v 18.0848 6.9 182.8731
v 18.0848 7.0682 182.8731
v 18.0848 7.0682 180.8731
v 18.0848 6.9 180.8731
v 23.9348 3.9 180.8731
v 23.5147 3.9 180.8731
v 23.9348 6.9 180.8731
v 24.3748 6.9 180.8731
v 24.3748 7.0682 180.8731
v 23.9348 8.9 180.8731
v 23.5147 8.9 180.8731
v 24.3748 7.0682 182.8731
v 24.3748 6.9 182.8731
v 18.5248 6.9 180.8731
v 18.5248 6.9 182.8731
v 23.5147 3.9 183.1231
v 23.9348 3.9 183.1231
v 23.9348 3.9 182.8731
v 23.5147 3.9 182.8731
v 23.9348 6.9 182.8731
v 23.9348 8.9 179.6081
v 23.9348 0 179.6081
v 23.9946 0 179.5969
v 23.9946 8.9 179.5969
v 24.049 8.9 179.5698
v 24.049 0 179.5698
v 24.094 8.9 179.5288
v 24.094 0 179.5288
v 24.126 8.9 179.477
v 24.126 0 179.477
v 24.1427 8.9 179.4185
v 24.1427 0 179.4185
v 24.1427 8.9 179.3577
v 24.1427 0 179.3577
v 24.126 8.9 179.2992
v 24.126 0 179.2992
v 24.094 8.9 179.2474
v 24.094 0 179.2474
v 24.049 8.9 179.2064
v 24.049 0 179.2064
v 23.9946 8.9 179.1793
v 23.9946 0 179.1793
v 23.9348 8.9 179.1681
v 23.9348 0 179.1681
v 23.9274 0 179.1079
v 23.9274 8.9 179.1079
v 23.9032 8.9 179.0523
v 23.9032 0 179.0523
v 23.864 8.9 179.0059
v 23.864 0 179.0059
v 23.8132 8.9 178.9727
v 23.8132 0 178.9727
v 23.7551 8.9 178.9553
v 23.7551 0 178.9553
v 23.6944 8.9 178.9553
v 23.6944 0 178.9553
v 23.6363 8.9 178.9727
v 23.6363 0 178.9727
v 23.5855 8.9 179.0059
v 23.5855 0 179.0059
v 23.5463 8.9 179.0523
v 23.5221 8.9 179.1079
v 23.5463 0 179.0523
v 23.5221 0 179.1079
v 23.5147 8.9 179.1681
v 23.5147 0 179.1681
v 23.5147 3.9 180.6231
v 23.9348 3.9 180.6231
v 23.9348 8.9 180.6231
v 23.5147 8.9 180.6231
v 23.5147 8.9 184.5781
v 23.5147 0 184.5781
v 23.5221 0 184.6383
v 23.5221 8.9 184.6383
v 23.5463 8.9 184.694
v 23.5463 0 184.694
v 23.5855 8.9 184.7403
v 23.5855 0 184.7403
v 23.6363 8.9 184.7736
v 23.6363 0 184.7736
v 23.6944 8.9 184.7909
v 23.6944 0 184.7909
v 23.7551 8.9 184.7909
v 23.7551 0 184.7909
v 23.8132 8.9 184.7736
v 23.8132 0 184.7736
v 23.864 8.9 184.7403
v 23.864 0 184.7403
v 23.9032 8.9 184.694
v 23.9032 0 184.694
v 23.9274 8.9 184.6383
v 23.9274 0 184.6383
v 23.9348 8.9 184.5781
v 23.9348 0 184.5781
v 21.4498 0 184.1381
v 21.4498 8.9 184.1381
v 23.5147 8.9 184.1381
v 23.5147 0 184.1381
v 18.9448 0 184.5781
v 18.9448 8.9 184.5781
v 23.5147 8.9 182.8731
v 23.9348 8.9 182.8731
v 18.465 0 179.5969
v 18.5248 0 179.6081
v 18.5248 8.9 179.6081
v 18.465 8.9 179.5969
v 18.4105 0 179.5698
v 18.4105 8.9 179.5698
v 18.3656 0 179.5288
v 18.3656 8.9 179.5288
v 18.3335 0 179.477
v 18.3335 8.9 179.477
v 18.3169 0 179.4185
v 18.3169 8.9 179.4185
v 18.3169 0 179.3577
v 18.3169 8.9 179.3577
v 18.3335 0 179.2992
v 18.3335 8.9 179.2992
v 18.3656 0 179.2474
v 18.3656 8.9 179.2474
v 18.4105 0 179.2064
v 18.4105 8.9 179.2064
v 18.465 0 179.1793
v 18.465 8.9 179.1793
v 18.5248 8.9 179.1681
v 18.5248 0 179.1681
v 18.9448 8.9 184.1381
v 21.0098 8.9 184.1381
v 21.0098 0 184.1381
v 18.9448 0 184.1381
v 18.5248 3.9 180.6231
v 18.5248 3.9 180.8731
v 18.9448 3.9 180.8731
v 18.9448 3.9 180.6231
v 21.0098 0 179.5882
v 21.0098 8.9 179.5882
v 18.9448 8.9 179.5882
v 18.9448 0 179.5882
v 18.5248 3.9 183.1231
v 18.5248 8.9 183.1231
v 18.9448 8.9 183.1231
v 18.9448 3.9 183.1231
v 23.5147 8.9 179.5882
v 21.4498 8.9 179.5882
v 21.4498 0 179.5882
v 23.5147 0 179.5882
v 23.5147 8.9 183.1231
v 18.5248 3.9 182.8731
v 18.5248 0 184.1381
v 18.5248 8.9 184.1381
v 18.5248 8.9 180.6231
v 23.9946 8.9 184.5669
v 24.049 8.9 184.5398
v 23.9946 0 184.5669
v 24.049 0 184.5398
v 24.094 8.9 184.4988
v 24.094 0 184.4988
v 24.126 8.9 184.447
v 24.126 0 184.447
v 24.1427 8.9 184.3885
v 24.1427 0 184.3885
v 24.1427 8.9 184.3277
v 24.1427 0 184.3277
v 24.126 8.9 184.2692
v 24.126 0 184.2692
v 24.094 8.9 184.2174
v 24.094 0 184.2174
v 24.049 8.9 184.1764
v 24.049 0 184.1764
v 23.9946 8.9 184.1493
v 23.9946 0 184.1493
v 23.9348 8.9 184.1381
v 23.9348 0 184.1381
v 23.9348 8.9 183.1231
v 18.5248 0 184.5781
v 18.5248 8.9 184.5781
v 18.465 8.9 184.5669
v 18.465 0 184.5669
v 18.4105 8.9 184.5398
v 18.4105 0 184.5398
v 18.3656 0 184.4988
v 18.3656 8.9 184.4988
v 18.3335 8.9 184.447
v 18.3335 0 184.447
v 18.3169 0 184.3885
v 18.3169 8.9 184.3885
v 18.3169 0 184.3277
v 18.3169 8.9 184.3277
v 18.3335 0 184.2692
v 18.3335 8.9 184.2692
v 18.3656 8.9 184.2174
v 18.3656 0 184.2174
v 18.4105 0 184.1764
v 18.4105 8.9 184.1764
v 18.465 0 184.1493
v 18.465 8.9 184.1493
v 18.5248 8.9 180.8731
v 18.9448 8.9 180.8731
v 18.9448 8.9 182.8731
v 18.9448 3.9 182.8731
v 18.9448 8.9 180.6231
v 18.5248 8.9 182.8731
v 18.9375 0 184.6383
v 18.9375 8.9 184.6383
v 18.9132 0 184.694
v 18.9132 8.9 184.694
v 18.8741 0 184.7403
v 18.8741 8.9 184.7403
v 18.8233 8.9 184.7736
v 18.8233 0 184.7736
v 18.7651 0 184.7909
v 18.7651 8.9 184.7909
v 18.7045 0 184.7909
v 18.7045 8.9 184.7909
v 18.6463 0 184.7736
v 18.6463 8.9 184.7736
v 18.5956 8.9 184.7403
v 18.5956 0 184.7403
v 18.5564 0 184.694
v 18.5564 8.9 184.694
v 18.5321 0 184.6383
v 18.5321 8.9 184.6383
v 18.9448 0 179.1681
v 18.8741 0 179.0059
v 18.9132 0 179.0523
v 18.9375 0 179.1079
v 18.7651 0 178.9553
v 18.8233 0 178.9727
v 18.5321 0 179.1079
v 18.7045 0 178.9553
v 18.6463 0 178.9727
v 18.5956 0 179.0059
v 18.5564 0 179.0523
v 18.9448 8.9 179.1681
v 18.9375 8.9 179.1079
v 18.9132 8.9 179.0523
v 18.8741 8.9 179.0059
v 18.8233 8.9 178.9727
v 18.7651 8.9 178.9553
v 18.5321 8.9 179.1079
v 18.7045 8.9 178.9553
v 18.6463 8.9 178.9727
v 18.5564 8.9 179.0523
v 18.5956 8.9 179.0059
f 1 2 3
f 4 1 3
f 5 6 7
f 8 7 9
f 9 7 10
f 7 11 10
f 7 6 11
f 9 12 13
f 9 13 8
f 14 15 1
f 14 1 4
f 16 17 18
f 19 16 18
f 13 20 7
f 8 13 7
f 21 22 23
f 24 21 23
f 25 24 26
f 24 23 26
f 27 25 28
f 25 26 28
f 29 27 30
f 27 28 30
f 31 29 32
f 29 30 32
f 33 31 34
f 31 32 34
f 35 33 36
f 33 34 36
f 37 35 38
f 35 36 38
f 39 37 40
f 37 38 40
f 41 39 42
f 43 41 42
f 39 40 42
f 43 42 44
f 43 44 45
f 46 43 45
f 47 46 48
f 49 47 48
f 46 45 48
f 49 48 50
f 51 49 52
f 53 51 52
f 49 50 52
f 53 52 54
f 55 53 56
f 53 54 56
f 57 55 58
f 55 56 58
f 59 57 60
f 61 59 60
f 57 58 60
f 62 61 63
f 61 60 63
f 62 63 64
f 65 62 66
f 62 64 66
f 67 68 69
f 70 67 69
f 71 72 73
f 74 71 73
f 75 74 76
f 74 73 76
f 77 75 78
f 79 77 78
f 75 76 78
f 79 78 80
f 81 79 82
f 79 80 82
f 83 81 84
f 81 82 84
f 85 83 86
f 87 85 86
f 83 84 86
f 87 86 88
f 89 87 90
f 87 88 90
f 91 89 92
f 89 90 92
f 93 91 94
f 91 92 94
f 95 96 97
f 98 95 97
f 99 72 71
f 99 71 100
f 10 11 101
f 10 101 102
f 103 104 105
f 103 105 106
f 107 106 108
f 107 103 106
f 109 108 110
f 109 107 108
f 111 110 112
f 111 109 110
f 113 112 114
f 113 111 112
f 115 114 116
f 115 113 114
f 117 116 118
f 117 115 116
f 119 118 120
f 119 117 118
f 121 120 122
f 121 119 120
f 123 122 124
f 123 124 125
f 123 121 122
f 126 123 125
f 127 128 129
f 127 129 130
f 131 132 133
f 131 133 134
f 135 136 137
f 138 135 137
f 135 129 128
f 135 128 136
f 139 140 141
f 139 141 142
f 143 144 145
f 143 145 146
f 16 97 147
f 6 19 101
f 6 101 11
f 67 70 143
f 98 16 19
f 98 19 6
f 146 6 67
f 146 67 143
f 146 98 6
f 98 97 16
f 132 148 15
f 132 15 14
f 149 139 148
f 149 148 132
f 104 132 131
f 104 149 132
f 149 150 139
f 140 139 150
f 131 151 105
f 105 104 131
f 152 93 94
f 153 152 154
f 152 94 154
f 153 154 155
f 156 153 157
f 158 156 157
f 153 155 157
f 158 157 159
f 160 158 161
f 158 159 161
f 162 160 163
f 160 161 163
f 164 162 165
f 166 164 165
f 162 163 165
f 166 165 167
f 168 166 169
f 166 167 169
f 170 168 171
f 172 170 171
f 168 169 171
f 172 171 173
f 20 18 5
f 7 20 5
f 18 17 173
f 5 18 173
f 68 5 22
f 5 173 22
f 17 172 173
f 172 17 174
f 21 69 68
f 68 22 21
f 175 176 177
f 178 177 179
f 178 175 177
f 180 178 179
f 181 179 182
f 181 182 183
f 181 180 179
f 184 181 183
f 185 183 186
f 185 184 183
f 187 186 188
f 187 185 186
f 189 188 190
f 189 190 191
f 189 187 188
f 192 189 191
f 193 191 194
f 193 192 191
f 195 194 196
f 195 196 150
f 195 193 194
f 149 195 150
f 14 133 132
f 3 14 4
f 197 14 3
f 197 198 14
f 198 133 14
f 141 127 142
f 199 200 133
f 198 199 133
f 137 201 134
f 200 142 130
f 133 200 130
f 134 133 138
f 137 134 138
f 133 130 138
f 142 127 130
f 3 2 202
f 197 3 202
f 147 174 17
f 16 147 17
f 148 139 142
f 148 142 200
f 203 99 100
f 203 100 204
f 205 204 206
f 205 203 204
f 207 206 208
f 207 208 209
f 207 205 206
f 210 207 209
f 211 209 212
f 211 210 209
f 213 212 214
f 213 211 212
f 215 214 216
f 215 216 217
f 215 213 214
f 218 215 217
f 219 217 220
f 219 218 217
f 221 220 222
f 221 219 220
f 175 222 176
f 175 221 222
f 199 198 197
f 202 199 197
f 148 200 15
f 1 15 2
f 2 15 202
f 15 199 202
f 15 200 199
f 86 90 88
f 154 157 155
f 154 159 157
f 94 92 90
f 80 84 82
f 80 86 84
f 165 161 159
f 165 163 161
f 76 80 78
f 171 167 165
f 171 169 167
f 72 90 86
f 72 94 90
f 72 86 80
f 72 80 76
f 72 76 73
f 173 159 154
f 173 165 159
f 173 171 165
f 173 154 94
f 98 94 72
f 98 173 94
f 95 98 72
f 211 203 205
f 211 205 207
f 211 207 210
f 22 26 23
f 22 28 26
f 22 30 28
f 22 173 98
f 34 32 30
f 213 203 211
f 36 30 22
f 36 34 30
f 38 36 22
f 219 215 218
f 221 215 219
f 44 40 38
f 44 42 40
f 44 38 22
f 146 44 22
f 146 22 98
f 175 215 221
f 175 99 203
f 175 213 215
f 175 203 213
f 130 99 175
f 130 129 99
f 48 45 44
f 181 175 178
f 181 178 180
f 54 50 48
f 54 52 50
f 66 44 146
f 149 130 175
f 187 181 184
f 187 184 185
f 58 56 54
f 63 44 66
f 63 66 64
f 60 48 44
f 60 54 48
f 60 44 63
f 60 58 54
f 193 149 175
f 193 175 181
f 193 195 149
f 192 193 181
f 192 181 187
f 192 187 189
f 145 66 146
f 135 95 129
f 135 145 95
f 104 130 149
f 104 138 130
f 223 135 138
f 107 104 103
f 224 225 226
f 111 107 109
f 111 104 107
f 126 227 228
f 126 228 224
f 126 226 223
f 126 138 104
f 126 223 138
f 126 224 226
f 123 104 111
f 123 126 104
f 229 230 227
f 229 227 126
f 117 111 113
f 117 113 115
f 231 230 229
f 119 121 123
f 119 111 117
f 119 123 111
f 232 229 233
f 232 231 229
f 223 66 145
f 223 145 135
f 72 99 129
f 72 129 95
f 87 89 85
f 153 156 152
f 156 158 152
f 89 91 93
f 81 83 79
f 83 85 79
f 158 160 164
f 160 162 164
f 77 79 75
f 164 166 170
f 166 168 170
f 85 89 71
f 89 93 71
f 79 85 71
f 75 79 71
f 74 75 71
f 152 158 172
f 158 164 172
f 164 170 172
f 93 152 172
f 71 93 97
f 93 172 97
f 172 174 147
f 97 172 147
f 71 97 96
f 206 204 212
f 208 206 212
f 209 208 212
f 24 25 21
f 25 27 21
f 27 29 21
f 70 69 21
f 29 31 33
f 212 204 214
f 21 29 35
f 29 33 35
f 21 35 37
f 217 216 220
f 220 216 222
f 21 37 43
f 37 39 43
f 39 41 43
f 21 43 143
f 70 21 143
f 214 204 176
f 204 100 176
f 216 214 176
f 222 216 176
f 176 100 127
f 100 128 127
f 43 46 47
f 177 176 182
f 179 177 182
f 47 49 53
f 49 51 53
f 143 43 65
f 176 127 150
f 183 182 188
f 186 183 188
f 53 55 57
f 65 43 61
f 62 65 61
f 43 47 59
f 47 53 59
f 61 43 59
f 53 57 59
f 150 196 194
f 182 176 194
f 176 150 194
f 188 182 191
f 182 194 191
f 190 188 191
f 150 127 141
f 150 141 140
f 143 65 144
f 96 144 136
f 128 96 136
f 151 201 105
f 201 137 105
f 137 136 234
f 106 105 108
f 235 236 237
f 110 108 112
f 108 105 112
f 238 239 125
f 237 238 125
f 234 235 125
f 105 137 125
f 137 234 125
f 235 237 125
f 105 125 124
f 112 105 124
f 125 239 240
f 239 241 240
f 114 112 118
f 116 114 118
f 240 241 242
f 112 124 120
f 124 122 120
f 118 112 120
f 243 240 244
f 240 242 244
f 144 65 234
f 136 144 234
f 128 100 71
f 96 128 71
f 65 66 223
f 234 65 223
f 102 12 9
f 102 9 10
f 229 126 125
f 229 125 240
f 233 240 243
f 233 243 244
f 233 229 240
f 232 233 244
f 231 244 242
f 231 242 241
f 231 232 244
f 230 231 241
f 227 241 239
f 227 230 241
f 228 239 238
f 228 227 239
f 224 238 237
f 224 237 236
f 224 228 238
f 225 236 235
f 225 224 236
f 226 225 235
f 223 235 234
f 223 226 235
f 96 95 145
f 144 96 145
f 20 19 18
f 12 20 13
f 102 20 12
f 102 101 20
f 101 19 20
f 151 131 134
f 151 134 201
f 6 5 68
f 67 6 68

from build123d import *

# Parameters (mm, degrees)
SKETCH1_W            = 5.41
SKETCH1_H            = 5.41
SKETCH1_W_2          = 4.549942703
SKETCH1_H_2          = 4.549942703
SKETCH1_W_3          = 0.44
BOSS_EXTRUDE8_DEPTH  = 8.9
SKETCH2_W            = 0.25
SKETCH2_H            = 3.415060647
SKETCH2_H_2          = 1.584939353
CUT_EXTRUDE1_DEPTH   = 1
SKETCH3_W            = 2
SKETCH3_H            = 0.168194263
BOSS_EXTRUDE9_DEPTH  = 0.44
BOSS_EXTRUDE10_DEPTH = 2
SKETCH6_W            = 3.011984057
SKETCH6_H            = 5.99945952
CUT_EXTRUDE2_DEPTH   = 10


# Read off the part's stored shape, not the designer's step: Mirror10
with BuildPart() as part:
    # Sketch1 → Boss-Extrude8 (new body)
    # profile 1 of 10: a face of its own
    with BuildSketch(Plane(origin=(61.037479951, 0, 196.423934756), x_dir=(1, 0, 0), z_dir=(0, 1, 0))):
        with Locations((-39.807700339, 14.550827763)):
            Rectangle(SKETCH1_W, SKETCH1_H)
        with Locations((-39.797728988, 14.560799114)):
            Rectangle(SKETCH1_W_2, SKETCH1_H_2, mode=Mode.SUBTRACT)
    # profile 2 of 10: a face of its own
    with BuildSketch(Plane(origin=(61.037479951, 0, 196.423934756), x_dir=(1, 0, 0), z_dir=(0, 1, 0))):
        with Locations((-39.807700339, 14.560799114)):
            Rectangle(SKETCH1_W_3, SKETCH1_H_2)
    # profile 3 of 10: a face of its own
    with BuildSketch(Plane(origin=(61.037479951, 0, 196.423934756), x_dir=(1, 0, 0), z_dir=(0, 1, 0))):
        with BuildLine():
            ThreePointArc((-42.092643043, 17.255827763), (-42.302671691, 17.470827763), (-42.512700339, 17.255827763))
            Line((-42.512700339, 17.255827763), (-42.092643043, 17.255827763))
        make_face()
    # profile 4 of 10: a face of its own
    with BuildSketch(Plane(origin=(61.037479951, 0, 196.423934756), x_dir=(1, 0, 0), z_dir=(0, 1, 0))):
        with BuildLine():
            ThreePointArc((-42.512700339, 17.255827763), (-42.722700339, 17.035827763), (-42.512700339, 16.815827763))
            Line((-42.512700339, 16.815827763), (-42.512700339, 17.255827763))
        make_face()
    # profile 5 of 10: a face of its own
    with BuildSketch(Plane(origin=(61.037479951, 0, 196.423934756), x_dir=(1, 0, 0), z_dir=(0, 1, 0))):
        with BuildLine():
            ThreePointArc((-42.512700339, 12.285827763), (-42.722700339, 12.065827763), (-42.512700339, 11.845827763))
            Line((-42.512700339, 11.845827763), (-42.512700339, 12.285827763))
        make_face()
    # profile 6 of 10: a face of its own
    with BuildSketch(Plane(origin=(61.037479951, 0, 196.423934756), x_dir=(1, 0, 0), z_dir=(0, 1, 0))):
        with BuildLine():
            Line((-42.092643043, 11.845827763), (-42.512700339, 11.845827763))
            ThreePointArc((-42.512700339, 11.845827763), (-42.302671691, 11.630827763), (-42.092643043, 11.845827763))
        make_face()
    # profile 7 of 10: a face of its own
    with BuildSketch(Plane(origin=(61.037479951, 0, 196.423934756), x_dir=(1, 0, 0), z_dir=(0, 1, 0))):
        with BuildLine():
            Line((-37.102700339, 11.845827763), (-37.522757636, 11.845827763))
            ThreePointArc((-37.522757636, 11.845827763), (-37.312728988, 11.630827763), (-37.102700339, 11.845827763))
        make_face()
    # profile 8 of 10: a face of its own
    with BuildSketch(Plane(origin=(61.037479951, 0, 196.423934756), x_dir=(1, 0, 0), z_dir=(0, 1, 0))):
        with BuildLine():
            Line((-37.102700339, 12.285827763), (-37.102700339, 11.845827763))
            ThreePointArc((-37.102700339, 11.845827763), (-36.892700339, 12.065827763), (-37.102700339, 12.285827763))
        make_face()
    # profile 9 of 10: a face of its own
    with BuildSketch(Plane(origin=(61.037479951, 0, 196.423934756), x_dir=(1, 0, 0), z_dir=(0, 1, 0))):
        with BuildLine():
            ThreePointArc((-37.102700339, 17.255827763), (-37.312728988, 17.470827763), (-37.522757636, 17.255827763))
            Line((-37.522757636, 17.255827763), (-37.102700339, 17.255827763))
        make_face()
    # profile 10 of 10: a face of its own
    with BuildSketch(Plane(origin=(61.037479951, 0, 196.423934756), x_dir=(1, 0, 0), z_dir=(0, 1, 0))):
        with BuildLine():
            Line((-37.102700339, 17.255827763), (-37.102700339, 16.815827763))
            ThreePointArc((-37.102700339, 16.815827763), (-36.892700339, 17.035827763), (-37.102700339, 17.255827763))
        make_face()
    extrude(amount=BOSS_EXTRUDE8_DEPTH)

    # Sketch2 → Cut-Extrude1 (cut)
    with BuildSketch(Plane(origin=(23.934779612, 0, 196.423934756), x_dir=(0, 0, -1), z_dir=(1, 0, 0))):
        with Locations((13.425827763, 5.607530324)):
            Rectangle(SKETCH2_W, SKETCH2_H)
        with Locations((13.425827763, 8.107530324)):
            Rectangle(SKETCH2_W, SKETCH2_H_2)
        with Locations((15.675827763, 8.107530324)):
            Rectangle(SKETCH2_W, SKETCH2_H_2)
        with Locations((15.675827763, 5.607530324)):
            Rectangle(SKETCH2_W, SKETCH2_H)
    extrude(amount=-CUT_EXTRUDE1_DEPTH, mode=Mode.SUBTRACT)

    # Sketch3 → Boss-Extrude9 (add)
    with BuildSketch(Plane(origin=(23.934779612, 0, 196.423934756), x_dir=(0, 0, -1), z_dir=(1, 0, 0))):
        with Locations((14.550827763, 6.984097132)):
            Rectangle(SKETCH3_W, SKETCH3_H)
    extrude(amount=BOSS_EXTRUDE9_DEPTH)

    # Sketch5 → Boss-Extrude10 (add)
    with BuildSketch(Plane(origin=(61.037479951, 0, 182.873106993), x_dir=(1, 0, 0), z_dir=(0, 0, 1))):
        Polygon((-36.662700339, 7.068194263), (-37.102700339, 8.9), (-37.102700339, 7.068194263), align=None)
    extrude(amount=-BOSS_EXTRUDE10_DEPTH)

    # Sketch6 → Cut-Extrude2 (cut)
    with BuildSketch(Plane(origin=(61.037479951, 8.9, 196.423934756), x_dir=(1, 0, 0), z_dir=(0, 1, 0))):
        with Locations((-41.313692367, 14.541370124)):
            Rectangle(SKETCH6_W, SKETCH6_H)
    extrude(amount=-CUT_EXTRUDE2_DEPTH, mode=Mode.SUBTRACT)

    # Mirror10: part across plane


with BuildPart() as part_1:
    add(part.part)
    add(part.part.mirror(Plane(origin=(21.229779612, -1.1, 178.882834872), x_dir=(0, 0, 1), z_dir=(1, 0, 0))))


solid = part_1.part
